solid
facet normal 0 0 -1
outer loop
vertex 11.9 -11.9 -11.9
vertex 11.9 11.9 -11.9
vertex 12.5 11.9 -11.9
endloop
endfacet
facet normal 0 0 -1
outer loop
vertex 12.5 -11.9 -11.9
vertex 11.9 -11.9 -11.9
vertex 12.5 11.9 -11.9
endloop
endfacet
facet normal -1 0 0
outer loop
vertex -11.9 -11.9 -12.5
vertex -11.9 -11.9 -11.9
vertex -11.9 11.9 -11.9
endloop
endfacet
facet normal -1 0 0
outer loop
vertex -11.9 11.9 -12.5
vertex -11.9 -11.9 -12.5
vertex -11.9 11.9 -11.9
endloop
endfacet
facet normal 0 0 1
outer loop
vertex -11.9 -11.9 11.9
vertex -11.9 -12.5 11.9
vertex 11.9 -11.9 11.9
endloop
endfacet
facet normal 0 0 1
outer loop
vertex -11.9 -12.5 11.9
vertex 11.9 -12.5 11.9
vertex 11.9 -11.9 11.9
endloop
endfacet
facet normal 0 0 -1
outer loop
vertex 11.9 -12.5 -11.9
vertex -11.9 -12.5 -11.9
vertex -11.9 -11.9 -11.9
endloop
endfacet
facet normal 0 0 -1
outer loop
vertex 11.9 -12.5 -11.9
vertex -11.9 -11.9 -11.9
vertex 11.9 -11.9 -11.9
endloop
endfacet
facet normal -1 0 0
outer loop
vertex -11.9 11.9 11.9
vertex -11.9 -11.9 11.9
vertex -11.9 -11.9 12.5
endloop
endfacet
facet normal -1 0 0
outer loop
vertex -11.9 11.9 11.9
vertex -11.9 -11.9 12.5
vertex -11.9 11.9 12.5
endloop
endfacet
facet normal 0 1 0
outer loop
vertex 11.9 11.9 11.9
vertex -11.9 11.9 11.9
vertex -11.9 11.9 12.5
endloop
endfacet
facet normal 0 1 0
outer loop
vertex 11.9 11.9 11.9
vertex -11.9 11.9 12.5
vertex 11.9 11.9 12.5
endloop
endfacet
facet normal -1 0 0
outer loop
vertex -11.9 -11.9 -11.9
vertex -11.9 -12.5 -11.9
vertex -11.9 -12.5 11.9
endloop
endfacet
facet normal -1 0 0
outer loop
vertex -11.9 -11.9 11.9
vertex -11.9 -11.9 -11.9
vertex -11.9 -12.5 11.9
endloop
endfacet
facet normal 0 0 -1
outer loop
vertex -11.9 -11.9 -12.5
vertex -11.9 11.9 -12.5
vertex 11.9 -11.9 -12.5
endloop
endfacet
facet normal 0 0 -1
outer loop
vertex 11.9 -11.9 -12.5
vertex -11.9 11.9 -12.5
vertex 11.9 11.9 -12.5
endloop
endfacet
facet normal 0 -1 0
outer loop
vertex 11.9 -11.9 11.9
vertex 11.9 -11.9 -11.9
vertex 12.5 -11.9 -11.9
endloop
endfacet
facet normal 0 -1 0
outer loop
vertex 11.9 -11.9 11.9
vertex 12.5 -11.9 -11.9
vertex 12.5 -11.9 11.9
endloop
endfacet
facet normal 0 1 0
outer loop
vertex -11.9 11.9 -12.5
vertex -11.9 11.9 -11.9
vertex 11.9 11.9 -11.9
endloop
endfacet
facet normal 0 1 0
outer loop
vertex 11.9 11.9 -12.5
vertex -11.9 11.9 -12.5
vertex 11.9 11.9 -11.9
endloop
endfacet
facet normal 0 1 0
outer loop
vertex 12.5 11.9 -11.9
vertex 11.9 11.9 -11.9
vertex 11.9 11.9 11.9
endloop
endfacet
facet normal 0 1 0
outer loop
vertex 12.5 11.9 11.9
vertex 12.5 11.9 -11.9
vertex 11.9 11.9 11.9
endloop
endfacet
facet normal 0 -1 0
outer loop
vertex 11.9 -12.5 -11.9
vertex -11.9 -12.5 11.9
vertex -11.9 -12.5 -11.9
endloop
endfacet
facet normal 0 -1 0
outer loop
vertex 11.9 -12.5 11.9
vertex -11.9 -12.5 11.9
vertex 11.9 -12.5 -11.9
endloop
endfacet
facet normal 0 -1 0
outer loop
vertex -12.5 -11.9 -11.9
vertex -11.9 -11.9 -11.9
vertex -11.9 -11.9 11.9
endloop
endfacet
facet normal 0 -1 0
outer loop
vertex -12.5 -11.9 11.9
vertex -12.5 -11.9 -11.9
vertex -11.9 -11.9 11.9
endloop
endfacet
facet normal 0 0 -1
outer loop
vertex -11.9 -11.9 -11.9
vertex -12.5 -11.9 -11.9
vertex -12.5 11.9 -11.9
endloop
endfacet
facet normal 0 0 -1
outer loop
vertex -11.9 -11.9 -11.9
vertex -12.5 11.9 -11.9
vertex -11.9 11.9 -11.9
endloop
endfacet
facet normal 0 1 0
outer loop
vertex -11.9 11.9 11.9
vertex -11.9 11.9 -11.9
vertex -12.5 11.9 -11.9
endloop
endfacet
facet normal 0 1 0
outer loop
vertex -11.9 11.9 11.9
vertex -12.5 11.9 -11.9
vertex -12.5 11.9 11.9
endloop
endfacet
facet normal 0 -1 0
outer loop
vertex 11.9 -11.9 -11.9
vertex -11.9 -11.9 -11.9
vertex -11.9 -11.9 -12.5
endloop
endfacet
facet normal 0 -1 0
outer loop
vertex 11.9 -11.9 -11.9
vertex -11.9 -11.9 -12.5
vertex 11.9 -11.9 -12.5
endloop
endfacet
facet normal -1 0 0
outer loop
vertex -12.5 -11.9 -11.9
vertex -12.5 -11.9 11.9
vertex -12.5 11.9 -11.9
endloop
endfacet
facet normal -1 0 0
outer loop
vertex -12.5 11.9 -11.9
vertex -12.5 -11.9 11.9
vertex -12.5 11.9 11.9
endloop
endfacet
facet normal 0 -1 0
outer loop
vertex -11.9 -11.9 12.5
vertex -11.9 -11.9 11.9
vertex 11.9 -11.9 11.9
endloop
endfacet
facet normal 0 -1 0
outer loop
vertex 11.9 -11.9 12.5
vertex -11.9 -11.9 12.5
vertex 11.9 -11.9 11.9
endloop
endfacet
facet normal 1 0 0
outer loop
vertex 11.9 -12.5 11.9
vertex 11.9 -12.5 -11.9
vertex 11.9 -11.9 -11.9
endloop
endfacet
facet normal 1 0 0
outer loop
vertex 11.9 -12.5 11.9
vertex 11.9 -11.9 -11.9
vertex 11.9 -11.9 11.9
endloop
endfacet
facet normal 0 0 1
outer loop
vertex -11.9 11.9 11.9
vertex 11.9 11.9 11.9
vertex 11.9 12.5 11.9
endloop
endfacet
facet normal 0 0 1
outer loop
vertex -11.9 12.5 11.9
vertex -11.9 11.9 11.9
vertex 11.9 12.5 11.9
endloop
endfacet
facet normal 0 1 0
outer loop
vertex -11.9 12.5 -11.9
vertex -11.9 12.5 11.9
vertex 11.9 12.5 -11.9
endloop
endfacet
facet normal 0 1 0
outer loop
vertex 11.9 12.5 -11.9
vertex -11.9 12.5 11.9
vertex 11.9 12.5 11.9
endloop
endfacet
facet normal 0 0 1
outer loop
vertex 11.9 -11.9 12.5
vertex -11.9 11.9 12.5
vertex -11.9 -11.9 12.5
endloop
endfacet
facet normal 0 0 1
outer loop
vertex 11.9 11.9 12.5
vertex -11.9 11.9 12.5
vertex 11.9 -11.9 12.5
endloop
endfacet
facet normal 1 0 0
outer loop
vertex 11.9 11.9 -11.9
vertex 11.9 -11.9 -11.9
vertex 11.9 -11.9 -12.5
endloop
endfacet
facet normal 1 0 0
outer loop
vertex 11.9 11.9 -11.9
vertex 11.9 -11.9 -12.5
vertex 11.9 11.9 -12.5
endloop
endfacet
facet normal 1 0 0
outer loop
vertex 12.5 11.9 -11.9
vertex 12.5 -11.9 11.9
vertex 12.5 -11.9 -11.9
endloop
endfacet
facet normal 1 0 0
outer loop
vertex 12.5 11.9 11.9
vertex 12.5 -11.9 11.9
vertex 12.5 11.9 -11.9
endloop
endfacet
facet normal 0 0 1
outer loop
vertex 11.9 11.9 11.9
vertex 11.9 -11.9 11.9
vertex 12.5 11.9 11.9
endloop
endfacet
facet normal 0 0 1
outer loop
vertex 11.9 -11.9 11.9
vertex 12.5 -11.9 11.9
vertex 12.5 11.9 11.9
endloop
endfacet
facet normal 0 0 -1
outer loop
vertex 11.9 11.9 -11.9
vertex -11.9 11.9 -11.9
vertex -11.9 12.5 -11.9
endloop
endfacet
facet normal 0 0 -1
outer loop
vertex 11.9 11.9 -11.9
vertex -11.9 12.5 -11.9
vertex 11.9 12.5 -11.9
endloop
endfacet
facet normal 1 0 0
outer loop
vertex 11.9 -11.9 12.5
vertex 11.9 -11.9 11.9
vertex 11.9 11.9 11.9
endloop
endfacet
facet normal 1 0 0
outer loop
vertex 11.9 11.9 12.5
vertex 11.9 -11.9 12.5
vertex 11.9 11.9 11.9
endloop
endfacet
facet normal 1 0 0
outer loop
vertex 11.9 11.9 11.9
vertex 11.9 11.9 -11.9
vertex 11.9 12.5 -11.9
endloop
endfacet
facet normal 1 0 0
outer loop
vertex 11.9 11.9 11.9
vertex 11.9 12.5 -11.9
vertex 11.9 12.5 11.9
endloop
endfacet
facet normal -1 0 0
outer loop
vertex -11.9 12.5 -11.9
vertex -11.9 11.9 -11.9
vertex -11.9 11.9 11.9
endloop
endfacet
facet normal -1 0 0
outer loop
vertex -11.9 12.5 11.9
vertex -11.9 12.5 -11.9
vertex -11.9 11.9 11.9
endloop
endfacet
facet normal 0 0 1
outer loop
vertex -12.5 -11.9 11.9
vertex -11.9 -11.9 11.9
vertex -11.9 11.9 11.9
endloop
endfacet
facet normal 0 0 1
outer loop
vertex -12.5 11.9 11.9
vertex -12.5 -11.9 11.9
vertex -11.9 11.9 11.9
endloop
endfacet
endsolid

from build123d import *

# Parameters (mm, degrees)
F0_W          = 23.8
F0_H          = 23.8
F3_DEPTH      = 12.5
F3_DEPTH_BACK = 12.5
F1_W          = 23.8
F1_H          = 23.8
F4_DEPTH      = 12.5
F4_DEPTH_BACK = 12.5
F2_W          = 23.8
F2_H          = 23.8
F5_DEPTH      = 12.5
F5_DEPTH_BACK = 12.5


with BuildPart() as f3:
    # F0 (on Front) → F3 (new body, two sides)
    with BuildSketch(Plane.XZ) as f3_sk:
        Rectangle(F0_W, F0_H)
    extrude(amount=F3_DEPTH)
    extrude(f3_sk.sketch, amount=-F3_DEPTH_BACK)

    # F1 (on Right) → F4 (join, two sides)
    with BuildSketch(Plane.YZ) as f4_sk:
        Rectangle(F1_W, F1_H)
    extrude(amount=F4_DEPTH)
    extrude(f4_sk.sketch, amount=-F4_DEPTH_BACK)

    # F2 (on Top) → F5 (join, two sides)
    with BuildSketch(Plane.XY) as f5_sk:
        Rectangle(F2_W, F2_H)
    extrude(amount=F5_DEPTH)
    extrude(f5_sk.sketch, amount=-F5_DEPTH_BACK)


solid = f3.part
